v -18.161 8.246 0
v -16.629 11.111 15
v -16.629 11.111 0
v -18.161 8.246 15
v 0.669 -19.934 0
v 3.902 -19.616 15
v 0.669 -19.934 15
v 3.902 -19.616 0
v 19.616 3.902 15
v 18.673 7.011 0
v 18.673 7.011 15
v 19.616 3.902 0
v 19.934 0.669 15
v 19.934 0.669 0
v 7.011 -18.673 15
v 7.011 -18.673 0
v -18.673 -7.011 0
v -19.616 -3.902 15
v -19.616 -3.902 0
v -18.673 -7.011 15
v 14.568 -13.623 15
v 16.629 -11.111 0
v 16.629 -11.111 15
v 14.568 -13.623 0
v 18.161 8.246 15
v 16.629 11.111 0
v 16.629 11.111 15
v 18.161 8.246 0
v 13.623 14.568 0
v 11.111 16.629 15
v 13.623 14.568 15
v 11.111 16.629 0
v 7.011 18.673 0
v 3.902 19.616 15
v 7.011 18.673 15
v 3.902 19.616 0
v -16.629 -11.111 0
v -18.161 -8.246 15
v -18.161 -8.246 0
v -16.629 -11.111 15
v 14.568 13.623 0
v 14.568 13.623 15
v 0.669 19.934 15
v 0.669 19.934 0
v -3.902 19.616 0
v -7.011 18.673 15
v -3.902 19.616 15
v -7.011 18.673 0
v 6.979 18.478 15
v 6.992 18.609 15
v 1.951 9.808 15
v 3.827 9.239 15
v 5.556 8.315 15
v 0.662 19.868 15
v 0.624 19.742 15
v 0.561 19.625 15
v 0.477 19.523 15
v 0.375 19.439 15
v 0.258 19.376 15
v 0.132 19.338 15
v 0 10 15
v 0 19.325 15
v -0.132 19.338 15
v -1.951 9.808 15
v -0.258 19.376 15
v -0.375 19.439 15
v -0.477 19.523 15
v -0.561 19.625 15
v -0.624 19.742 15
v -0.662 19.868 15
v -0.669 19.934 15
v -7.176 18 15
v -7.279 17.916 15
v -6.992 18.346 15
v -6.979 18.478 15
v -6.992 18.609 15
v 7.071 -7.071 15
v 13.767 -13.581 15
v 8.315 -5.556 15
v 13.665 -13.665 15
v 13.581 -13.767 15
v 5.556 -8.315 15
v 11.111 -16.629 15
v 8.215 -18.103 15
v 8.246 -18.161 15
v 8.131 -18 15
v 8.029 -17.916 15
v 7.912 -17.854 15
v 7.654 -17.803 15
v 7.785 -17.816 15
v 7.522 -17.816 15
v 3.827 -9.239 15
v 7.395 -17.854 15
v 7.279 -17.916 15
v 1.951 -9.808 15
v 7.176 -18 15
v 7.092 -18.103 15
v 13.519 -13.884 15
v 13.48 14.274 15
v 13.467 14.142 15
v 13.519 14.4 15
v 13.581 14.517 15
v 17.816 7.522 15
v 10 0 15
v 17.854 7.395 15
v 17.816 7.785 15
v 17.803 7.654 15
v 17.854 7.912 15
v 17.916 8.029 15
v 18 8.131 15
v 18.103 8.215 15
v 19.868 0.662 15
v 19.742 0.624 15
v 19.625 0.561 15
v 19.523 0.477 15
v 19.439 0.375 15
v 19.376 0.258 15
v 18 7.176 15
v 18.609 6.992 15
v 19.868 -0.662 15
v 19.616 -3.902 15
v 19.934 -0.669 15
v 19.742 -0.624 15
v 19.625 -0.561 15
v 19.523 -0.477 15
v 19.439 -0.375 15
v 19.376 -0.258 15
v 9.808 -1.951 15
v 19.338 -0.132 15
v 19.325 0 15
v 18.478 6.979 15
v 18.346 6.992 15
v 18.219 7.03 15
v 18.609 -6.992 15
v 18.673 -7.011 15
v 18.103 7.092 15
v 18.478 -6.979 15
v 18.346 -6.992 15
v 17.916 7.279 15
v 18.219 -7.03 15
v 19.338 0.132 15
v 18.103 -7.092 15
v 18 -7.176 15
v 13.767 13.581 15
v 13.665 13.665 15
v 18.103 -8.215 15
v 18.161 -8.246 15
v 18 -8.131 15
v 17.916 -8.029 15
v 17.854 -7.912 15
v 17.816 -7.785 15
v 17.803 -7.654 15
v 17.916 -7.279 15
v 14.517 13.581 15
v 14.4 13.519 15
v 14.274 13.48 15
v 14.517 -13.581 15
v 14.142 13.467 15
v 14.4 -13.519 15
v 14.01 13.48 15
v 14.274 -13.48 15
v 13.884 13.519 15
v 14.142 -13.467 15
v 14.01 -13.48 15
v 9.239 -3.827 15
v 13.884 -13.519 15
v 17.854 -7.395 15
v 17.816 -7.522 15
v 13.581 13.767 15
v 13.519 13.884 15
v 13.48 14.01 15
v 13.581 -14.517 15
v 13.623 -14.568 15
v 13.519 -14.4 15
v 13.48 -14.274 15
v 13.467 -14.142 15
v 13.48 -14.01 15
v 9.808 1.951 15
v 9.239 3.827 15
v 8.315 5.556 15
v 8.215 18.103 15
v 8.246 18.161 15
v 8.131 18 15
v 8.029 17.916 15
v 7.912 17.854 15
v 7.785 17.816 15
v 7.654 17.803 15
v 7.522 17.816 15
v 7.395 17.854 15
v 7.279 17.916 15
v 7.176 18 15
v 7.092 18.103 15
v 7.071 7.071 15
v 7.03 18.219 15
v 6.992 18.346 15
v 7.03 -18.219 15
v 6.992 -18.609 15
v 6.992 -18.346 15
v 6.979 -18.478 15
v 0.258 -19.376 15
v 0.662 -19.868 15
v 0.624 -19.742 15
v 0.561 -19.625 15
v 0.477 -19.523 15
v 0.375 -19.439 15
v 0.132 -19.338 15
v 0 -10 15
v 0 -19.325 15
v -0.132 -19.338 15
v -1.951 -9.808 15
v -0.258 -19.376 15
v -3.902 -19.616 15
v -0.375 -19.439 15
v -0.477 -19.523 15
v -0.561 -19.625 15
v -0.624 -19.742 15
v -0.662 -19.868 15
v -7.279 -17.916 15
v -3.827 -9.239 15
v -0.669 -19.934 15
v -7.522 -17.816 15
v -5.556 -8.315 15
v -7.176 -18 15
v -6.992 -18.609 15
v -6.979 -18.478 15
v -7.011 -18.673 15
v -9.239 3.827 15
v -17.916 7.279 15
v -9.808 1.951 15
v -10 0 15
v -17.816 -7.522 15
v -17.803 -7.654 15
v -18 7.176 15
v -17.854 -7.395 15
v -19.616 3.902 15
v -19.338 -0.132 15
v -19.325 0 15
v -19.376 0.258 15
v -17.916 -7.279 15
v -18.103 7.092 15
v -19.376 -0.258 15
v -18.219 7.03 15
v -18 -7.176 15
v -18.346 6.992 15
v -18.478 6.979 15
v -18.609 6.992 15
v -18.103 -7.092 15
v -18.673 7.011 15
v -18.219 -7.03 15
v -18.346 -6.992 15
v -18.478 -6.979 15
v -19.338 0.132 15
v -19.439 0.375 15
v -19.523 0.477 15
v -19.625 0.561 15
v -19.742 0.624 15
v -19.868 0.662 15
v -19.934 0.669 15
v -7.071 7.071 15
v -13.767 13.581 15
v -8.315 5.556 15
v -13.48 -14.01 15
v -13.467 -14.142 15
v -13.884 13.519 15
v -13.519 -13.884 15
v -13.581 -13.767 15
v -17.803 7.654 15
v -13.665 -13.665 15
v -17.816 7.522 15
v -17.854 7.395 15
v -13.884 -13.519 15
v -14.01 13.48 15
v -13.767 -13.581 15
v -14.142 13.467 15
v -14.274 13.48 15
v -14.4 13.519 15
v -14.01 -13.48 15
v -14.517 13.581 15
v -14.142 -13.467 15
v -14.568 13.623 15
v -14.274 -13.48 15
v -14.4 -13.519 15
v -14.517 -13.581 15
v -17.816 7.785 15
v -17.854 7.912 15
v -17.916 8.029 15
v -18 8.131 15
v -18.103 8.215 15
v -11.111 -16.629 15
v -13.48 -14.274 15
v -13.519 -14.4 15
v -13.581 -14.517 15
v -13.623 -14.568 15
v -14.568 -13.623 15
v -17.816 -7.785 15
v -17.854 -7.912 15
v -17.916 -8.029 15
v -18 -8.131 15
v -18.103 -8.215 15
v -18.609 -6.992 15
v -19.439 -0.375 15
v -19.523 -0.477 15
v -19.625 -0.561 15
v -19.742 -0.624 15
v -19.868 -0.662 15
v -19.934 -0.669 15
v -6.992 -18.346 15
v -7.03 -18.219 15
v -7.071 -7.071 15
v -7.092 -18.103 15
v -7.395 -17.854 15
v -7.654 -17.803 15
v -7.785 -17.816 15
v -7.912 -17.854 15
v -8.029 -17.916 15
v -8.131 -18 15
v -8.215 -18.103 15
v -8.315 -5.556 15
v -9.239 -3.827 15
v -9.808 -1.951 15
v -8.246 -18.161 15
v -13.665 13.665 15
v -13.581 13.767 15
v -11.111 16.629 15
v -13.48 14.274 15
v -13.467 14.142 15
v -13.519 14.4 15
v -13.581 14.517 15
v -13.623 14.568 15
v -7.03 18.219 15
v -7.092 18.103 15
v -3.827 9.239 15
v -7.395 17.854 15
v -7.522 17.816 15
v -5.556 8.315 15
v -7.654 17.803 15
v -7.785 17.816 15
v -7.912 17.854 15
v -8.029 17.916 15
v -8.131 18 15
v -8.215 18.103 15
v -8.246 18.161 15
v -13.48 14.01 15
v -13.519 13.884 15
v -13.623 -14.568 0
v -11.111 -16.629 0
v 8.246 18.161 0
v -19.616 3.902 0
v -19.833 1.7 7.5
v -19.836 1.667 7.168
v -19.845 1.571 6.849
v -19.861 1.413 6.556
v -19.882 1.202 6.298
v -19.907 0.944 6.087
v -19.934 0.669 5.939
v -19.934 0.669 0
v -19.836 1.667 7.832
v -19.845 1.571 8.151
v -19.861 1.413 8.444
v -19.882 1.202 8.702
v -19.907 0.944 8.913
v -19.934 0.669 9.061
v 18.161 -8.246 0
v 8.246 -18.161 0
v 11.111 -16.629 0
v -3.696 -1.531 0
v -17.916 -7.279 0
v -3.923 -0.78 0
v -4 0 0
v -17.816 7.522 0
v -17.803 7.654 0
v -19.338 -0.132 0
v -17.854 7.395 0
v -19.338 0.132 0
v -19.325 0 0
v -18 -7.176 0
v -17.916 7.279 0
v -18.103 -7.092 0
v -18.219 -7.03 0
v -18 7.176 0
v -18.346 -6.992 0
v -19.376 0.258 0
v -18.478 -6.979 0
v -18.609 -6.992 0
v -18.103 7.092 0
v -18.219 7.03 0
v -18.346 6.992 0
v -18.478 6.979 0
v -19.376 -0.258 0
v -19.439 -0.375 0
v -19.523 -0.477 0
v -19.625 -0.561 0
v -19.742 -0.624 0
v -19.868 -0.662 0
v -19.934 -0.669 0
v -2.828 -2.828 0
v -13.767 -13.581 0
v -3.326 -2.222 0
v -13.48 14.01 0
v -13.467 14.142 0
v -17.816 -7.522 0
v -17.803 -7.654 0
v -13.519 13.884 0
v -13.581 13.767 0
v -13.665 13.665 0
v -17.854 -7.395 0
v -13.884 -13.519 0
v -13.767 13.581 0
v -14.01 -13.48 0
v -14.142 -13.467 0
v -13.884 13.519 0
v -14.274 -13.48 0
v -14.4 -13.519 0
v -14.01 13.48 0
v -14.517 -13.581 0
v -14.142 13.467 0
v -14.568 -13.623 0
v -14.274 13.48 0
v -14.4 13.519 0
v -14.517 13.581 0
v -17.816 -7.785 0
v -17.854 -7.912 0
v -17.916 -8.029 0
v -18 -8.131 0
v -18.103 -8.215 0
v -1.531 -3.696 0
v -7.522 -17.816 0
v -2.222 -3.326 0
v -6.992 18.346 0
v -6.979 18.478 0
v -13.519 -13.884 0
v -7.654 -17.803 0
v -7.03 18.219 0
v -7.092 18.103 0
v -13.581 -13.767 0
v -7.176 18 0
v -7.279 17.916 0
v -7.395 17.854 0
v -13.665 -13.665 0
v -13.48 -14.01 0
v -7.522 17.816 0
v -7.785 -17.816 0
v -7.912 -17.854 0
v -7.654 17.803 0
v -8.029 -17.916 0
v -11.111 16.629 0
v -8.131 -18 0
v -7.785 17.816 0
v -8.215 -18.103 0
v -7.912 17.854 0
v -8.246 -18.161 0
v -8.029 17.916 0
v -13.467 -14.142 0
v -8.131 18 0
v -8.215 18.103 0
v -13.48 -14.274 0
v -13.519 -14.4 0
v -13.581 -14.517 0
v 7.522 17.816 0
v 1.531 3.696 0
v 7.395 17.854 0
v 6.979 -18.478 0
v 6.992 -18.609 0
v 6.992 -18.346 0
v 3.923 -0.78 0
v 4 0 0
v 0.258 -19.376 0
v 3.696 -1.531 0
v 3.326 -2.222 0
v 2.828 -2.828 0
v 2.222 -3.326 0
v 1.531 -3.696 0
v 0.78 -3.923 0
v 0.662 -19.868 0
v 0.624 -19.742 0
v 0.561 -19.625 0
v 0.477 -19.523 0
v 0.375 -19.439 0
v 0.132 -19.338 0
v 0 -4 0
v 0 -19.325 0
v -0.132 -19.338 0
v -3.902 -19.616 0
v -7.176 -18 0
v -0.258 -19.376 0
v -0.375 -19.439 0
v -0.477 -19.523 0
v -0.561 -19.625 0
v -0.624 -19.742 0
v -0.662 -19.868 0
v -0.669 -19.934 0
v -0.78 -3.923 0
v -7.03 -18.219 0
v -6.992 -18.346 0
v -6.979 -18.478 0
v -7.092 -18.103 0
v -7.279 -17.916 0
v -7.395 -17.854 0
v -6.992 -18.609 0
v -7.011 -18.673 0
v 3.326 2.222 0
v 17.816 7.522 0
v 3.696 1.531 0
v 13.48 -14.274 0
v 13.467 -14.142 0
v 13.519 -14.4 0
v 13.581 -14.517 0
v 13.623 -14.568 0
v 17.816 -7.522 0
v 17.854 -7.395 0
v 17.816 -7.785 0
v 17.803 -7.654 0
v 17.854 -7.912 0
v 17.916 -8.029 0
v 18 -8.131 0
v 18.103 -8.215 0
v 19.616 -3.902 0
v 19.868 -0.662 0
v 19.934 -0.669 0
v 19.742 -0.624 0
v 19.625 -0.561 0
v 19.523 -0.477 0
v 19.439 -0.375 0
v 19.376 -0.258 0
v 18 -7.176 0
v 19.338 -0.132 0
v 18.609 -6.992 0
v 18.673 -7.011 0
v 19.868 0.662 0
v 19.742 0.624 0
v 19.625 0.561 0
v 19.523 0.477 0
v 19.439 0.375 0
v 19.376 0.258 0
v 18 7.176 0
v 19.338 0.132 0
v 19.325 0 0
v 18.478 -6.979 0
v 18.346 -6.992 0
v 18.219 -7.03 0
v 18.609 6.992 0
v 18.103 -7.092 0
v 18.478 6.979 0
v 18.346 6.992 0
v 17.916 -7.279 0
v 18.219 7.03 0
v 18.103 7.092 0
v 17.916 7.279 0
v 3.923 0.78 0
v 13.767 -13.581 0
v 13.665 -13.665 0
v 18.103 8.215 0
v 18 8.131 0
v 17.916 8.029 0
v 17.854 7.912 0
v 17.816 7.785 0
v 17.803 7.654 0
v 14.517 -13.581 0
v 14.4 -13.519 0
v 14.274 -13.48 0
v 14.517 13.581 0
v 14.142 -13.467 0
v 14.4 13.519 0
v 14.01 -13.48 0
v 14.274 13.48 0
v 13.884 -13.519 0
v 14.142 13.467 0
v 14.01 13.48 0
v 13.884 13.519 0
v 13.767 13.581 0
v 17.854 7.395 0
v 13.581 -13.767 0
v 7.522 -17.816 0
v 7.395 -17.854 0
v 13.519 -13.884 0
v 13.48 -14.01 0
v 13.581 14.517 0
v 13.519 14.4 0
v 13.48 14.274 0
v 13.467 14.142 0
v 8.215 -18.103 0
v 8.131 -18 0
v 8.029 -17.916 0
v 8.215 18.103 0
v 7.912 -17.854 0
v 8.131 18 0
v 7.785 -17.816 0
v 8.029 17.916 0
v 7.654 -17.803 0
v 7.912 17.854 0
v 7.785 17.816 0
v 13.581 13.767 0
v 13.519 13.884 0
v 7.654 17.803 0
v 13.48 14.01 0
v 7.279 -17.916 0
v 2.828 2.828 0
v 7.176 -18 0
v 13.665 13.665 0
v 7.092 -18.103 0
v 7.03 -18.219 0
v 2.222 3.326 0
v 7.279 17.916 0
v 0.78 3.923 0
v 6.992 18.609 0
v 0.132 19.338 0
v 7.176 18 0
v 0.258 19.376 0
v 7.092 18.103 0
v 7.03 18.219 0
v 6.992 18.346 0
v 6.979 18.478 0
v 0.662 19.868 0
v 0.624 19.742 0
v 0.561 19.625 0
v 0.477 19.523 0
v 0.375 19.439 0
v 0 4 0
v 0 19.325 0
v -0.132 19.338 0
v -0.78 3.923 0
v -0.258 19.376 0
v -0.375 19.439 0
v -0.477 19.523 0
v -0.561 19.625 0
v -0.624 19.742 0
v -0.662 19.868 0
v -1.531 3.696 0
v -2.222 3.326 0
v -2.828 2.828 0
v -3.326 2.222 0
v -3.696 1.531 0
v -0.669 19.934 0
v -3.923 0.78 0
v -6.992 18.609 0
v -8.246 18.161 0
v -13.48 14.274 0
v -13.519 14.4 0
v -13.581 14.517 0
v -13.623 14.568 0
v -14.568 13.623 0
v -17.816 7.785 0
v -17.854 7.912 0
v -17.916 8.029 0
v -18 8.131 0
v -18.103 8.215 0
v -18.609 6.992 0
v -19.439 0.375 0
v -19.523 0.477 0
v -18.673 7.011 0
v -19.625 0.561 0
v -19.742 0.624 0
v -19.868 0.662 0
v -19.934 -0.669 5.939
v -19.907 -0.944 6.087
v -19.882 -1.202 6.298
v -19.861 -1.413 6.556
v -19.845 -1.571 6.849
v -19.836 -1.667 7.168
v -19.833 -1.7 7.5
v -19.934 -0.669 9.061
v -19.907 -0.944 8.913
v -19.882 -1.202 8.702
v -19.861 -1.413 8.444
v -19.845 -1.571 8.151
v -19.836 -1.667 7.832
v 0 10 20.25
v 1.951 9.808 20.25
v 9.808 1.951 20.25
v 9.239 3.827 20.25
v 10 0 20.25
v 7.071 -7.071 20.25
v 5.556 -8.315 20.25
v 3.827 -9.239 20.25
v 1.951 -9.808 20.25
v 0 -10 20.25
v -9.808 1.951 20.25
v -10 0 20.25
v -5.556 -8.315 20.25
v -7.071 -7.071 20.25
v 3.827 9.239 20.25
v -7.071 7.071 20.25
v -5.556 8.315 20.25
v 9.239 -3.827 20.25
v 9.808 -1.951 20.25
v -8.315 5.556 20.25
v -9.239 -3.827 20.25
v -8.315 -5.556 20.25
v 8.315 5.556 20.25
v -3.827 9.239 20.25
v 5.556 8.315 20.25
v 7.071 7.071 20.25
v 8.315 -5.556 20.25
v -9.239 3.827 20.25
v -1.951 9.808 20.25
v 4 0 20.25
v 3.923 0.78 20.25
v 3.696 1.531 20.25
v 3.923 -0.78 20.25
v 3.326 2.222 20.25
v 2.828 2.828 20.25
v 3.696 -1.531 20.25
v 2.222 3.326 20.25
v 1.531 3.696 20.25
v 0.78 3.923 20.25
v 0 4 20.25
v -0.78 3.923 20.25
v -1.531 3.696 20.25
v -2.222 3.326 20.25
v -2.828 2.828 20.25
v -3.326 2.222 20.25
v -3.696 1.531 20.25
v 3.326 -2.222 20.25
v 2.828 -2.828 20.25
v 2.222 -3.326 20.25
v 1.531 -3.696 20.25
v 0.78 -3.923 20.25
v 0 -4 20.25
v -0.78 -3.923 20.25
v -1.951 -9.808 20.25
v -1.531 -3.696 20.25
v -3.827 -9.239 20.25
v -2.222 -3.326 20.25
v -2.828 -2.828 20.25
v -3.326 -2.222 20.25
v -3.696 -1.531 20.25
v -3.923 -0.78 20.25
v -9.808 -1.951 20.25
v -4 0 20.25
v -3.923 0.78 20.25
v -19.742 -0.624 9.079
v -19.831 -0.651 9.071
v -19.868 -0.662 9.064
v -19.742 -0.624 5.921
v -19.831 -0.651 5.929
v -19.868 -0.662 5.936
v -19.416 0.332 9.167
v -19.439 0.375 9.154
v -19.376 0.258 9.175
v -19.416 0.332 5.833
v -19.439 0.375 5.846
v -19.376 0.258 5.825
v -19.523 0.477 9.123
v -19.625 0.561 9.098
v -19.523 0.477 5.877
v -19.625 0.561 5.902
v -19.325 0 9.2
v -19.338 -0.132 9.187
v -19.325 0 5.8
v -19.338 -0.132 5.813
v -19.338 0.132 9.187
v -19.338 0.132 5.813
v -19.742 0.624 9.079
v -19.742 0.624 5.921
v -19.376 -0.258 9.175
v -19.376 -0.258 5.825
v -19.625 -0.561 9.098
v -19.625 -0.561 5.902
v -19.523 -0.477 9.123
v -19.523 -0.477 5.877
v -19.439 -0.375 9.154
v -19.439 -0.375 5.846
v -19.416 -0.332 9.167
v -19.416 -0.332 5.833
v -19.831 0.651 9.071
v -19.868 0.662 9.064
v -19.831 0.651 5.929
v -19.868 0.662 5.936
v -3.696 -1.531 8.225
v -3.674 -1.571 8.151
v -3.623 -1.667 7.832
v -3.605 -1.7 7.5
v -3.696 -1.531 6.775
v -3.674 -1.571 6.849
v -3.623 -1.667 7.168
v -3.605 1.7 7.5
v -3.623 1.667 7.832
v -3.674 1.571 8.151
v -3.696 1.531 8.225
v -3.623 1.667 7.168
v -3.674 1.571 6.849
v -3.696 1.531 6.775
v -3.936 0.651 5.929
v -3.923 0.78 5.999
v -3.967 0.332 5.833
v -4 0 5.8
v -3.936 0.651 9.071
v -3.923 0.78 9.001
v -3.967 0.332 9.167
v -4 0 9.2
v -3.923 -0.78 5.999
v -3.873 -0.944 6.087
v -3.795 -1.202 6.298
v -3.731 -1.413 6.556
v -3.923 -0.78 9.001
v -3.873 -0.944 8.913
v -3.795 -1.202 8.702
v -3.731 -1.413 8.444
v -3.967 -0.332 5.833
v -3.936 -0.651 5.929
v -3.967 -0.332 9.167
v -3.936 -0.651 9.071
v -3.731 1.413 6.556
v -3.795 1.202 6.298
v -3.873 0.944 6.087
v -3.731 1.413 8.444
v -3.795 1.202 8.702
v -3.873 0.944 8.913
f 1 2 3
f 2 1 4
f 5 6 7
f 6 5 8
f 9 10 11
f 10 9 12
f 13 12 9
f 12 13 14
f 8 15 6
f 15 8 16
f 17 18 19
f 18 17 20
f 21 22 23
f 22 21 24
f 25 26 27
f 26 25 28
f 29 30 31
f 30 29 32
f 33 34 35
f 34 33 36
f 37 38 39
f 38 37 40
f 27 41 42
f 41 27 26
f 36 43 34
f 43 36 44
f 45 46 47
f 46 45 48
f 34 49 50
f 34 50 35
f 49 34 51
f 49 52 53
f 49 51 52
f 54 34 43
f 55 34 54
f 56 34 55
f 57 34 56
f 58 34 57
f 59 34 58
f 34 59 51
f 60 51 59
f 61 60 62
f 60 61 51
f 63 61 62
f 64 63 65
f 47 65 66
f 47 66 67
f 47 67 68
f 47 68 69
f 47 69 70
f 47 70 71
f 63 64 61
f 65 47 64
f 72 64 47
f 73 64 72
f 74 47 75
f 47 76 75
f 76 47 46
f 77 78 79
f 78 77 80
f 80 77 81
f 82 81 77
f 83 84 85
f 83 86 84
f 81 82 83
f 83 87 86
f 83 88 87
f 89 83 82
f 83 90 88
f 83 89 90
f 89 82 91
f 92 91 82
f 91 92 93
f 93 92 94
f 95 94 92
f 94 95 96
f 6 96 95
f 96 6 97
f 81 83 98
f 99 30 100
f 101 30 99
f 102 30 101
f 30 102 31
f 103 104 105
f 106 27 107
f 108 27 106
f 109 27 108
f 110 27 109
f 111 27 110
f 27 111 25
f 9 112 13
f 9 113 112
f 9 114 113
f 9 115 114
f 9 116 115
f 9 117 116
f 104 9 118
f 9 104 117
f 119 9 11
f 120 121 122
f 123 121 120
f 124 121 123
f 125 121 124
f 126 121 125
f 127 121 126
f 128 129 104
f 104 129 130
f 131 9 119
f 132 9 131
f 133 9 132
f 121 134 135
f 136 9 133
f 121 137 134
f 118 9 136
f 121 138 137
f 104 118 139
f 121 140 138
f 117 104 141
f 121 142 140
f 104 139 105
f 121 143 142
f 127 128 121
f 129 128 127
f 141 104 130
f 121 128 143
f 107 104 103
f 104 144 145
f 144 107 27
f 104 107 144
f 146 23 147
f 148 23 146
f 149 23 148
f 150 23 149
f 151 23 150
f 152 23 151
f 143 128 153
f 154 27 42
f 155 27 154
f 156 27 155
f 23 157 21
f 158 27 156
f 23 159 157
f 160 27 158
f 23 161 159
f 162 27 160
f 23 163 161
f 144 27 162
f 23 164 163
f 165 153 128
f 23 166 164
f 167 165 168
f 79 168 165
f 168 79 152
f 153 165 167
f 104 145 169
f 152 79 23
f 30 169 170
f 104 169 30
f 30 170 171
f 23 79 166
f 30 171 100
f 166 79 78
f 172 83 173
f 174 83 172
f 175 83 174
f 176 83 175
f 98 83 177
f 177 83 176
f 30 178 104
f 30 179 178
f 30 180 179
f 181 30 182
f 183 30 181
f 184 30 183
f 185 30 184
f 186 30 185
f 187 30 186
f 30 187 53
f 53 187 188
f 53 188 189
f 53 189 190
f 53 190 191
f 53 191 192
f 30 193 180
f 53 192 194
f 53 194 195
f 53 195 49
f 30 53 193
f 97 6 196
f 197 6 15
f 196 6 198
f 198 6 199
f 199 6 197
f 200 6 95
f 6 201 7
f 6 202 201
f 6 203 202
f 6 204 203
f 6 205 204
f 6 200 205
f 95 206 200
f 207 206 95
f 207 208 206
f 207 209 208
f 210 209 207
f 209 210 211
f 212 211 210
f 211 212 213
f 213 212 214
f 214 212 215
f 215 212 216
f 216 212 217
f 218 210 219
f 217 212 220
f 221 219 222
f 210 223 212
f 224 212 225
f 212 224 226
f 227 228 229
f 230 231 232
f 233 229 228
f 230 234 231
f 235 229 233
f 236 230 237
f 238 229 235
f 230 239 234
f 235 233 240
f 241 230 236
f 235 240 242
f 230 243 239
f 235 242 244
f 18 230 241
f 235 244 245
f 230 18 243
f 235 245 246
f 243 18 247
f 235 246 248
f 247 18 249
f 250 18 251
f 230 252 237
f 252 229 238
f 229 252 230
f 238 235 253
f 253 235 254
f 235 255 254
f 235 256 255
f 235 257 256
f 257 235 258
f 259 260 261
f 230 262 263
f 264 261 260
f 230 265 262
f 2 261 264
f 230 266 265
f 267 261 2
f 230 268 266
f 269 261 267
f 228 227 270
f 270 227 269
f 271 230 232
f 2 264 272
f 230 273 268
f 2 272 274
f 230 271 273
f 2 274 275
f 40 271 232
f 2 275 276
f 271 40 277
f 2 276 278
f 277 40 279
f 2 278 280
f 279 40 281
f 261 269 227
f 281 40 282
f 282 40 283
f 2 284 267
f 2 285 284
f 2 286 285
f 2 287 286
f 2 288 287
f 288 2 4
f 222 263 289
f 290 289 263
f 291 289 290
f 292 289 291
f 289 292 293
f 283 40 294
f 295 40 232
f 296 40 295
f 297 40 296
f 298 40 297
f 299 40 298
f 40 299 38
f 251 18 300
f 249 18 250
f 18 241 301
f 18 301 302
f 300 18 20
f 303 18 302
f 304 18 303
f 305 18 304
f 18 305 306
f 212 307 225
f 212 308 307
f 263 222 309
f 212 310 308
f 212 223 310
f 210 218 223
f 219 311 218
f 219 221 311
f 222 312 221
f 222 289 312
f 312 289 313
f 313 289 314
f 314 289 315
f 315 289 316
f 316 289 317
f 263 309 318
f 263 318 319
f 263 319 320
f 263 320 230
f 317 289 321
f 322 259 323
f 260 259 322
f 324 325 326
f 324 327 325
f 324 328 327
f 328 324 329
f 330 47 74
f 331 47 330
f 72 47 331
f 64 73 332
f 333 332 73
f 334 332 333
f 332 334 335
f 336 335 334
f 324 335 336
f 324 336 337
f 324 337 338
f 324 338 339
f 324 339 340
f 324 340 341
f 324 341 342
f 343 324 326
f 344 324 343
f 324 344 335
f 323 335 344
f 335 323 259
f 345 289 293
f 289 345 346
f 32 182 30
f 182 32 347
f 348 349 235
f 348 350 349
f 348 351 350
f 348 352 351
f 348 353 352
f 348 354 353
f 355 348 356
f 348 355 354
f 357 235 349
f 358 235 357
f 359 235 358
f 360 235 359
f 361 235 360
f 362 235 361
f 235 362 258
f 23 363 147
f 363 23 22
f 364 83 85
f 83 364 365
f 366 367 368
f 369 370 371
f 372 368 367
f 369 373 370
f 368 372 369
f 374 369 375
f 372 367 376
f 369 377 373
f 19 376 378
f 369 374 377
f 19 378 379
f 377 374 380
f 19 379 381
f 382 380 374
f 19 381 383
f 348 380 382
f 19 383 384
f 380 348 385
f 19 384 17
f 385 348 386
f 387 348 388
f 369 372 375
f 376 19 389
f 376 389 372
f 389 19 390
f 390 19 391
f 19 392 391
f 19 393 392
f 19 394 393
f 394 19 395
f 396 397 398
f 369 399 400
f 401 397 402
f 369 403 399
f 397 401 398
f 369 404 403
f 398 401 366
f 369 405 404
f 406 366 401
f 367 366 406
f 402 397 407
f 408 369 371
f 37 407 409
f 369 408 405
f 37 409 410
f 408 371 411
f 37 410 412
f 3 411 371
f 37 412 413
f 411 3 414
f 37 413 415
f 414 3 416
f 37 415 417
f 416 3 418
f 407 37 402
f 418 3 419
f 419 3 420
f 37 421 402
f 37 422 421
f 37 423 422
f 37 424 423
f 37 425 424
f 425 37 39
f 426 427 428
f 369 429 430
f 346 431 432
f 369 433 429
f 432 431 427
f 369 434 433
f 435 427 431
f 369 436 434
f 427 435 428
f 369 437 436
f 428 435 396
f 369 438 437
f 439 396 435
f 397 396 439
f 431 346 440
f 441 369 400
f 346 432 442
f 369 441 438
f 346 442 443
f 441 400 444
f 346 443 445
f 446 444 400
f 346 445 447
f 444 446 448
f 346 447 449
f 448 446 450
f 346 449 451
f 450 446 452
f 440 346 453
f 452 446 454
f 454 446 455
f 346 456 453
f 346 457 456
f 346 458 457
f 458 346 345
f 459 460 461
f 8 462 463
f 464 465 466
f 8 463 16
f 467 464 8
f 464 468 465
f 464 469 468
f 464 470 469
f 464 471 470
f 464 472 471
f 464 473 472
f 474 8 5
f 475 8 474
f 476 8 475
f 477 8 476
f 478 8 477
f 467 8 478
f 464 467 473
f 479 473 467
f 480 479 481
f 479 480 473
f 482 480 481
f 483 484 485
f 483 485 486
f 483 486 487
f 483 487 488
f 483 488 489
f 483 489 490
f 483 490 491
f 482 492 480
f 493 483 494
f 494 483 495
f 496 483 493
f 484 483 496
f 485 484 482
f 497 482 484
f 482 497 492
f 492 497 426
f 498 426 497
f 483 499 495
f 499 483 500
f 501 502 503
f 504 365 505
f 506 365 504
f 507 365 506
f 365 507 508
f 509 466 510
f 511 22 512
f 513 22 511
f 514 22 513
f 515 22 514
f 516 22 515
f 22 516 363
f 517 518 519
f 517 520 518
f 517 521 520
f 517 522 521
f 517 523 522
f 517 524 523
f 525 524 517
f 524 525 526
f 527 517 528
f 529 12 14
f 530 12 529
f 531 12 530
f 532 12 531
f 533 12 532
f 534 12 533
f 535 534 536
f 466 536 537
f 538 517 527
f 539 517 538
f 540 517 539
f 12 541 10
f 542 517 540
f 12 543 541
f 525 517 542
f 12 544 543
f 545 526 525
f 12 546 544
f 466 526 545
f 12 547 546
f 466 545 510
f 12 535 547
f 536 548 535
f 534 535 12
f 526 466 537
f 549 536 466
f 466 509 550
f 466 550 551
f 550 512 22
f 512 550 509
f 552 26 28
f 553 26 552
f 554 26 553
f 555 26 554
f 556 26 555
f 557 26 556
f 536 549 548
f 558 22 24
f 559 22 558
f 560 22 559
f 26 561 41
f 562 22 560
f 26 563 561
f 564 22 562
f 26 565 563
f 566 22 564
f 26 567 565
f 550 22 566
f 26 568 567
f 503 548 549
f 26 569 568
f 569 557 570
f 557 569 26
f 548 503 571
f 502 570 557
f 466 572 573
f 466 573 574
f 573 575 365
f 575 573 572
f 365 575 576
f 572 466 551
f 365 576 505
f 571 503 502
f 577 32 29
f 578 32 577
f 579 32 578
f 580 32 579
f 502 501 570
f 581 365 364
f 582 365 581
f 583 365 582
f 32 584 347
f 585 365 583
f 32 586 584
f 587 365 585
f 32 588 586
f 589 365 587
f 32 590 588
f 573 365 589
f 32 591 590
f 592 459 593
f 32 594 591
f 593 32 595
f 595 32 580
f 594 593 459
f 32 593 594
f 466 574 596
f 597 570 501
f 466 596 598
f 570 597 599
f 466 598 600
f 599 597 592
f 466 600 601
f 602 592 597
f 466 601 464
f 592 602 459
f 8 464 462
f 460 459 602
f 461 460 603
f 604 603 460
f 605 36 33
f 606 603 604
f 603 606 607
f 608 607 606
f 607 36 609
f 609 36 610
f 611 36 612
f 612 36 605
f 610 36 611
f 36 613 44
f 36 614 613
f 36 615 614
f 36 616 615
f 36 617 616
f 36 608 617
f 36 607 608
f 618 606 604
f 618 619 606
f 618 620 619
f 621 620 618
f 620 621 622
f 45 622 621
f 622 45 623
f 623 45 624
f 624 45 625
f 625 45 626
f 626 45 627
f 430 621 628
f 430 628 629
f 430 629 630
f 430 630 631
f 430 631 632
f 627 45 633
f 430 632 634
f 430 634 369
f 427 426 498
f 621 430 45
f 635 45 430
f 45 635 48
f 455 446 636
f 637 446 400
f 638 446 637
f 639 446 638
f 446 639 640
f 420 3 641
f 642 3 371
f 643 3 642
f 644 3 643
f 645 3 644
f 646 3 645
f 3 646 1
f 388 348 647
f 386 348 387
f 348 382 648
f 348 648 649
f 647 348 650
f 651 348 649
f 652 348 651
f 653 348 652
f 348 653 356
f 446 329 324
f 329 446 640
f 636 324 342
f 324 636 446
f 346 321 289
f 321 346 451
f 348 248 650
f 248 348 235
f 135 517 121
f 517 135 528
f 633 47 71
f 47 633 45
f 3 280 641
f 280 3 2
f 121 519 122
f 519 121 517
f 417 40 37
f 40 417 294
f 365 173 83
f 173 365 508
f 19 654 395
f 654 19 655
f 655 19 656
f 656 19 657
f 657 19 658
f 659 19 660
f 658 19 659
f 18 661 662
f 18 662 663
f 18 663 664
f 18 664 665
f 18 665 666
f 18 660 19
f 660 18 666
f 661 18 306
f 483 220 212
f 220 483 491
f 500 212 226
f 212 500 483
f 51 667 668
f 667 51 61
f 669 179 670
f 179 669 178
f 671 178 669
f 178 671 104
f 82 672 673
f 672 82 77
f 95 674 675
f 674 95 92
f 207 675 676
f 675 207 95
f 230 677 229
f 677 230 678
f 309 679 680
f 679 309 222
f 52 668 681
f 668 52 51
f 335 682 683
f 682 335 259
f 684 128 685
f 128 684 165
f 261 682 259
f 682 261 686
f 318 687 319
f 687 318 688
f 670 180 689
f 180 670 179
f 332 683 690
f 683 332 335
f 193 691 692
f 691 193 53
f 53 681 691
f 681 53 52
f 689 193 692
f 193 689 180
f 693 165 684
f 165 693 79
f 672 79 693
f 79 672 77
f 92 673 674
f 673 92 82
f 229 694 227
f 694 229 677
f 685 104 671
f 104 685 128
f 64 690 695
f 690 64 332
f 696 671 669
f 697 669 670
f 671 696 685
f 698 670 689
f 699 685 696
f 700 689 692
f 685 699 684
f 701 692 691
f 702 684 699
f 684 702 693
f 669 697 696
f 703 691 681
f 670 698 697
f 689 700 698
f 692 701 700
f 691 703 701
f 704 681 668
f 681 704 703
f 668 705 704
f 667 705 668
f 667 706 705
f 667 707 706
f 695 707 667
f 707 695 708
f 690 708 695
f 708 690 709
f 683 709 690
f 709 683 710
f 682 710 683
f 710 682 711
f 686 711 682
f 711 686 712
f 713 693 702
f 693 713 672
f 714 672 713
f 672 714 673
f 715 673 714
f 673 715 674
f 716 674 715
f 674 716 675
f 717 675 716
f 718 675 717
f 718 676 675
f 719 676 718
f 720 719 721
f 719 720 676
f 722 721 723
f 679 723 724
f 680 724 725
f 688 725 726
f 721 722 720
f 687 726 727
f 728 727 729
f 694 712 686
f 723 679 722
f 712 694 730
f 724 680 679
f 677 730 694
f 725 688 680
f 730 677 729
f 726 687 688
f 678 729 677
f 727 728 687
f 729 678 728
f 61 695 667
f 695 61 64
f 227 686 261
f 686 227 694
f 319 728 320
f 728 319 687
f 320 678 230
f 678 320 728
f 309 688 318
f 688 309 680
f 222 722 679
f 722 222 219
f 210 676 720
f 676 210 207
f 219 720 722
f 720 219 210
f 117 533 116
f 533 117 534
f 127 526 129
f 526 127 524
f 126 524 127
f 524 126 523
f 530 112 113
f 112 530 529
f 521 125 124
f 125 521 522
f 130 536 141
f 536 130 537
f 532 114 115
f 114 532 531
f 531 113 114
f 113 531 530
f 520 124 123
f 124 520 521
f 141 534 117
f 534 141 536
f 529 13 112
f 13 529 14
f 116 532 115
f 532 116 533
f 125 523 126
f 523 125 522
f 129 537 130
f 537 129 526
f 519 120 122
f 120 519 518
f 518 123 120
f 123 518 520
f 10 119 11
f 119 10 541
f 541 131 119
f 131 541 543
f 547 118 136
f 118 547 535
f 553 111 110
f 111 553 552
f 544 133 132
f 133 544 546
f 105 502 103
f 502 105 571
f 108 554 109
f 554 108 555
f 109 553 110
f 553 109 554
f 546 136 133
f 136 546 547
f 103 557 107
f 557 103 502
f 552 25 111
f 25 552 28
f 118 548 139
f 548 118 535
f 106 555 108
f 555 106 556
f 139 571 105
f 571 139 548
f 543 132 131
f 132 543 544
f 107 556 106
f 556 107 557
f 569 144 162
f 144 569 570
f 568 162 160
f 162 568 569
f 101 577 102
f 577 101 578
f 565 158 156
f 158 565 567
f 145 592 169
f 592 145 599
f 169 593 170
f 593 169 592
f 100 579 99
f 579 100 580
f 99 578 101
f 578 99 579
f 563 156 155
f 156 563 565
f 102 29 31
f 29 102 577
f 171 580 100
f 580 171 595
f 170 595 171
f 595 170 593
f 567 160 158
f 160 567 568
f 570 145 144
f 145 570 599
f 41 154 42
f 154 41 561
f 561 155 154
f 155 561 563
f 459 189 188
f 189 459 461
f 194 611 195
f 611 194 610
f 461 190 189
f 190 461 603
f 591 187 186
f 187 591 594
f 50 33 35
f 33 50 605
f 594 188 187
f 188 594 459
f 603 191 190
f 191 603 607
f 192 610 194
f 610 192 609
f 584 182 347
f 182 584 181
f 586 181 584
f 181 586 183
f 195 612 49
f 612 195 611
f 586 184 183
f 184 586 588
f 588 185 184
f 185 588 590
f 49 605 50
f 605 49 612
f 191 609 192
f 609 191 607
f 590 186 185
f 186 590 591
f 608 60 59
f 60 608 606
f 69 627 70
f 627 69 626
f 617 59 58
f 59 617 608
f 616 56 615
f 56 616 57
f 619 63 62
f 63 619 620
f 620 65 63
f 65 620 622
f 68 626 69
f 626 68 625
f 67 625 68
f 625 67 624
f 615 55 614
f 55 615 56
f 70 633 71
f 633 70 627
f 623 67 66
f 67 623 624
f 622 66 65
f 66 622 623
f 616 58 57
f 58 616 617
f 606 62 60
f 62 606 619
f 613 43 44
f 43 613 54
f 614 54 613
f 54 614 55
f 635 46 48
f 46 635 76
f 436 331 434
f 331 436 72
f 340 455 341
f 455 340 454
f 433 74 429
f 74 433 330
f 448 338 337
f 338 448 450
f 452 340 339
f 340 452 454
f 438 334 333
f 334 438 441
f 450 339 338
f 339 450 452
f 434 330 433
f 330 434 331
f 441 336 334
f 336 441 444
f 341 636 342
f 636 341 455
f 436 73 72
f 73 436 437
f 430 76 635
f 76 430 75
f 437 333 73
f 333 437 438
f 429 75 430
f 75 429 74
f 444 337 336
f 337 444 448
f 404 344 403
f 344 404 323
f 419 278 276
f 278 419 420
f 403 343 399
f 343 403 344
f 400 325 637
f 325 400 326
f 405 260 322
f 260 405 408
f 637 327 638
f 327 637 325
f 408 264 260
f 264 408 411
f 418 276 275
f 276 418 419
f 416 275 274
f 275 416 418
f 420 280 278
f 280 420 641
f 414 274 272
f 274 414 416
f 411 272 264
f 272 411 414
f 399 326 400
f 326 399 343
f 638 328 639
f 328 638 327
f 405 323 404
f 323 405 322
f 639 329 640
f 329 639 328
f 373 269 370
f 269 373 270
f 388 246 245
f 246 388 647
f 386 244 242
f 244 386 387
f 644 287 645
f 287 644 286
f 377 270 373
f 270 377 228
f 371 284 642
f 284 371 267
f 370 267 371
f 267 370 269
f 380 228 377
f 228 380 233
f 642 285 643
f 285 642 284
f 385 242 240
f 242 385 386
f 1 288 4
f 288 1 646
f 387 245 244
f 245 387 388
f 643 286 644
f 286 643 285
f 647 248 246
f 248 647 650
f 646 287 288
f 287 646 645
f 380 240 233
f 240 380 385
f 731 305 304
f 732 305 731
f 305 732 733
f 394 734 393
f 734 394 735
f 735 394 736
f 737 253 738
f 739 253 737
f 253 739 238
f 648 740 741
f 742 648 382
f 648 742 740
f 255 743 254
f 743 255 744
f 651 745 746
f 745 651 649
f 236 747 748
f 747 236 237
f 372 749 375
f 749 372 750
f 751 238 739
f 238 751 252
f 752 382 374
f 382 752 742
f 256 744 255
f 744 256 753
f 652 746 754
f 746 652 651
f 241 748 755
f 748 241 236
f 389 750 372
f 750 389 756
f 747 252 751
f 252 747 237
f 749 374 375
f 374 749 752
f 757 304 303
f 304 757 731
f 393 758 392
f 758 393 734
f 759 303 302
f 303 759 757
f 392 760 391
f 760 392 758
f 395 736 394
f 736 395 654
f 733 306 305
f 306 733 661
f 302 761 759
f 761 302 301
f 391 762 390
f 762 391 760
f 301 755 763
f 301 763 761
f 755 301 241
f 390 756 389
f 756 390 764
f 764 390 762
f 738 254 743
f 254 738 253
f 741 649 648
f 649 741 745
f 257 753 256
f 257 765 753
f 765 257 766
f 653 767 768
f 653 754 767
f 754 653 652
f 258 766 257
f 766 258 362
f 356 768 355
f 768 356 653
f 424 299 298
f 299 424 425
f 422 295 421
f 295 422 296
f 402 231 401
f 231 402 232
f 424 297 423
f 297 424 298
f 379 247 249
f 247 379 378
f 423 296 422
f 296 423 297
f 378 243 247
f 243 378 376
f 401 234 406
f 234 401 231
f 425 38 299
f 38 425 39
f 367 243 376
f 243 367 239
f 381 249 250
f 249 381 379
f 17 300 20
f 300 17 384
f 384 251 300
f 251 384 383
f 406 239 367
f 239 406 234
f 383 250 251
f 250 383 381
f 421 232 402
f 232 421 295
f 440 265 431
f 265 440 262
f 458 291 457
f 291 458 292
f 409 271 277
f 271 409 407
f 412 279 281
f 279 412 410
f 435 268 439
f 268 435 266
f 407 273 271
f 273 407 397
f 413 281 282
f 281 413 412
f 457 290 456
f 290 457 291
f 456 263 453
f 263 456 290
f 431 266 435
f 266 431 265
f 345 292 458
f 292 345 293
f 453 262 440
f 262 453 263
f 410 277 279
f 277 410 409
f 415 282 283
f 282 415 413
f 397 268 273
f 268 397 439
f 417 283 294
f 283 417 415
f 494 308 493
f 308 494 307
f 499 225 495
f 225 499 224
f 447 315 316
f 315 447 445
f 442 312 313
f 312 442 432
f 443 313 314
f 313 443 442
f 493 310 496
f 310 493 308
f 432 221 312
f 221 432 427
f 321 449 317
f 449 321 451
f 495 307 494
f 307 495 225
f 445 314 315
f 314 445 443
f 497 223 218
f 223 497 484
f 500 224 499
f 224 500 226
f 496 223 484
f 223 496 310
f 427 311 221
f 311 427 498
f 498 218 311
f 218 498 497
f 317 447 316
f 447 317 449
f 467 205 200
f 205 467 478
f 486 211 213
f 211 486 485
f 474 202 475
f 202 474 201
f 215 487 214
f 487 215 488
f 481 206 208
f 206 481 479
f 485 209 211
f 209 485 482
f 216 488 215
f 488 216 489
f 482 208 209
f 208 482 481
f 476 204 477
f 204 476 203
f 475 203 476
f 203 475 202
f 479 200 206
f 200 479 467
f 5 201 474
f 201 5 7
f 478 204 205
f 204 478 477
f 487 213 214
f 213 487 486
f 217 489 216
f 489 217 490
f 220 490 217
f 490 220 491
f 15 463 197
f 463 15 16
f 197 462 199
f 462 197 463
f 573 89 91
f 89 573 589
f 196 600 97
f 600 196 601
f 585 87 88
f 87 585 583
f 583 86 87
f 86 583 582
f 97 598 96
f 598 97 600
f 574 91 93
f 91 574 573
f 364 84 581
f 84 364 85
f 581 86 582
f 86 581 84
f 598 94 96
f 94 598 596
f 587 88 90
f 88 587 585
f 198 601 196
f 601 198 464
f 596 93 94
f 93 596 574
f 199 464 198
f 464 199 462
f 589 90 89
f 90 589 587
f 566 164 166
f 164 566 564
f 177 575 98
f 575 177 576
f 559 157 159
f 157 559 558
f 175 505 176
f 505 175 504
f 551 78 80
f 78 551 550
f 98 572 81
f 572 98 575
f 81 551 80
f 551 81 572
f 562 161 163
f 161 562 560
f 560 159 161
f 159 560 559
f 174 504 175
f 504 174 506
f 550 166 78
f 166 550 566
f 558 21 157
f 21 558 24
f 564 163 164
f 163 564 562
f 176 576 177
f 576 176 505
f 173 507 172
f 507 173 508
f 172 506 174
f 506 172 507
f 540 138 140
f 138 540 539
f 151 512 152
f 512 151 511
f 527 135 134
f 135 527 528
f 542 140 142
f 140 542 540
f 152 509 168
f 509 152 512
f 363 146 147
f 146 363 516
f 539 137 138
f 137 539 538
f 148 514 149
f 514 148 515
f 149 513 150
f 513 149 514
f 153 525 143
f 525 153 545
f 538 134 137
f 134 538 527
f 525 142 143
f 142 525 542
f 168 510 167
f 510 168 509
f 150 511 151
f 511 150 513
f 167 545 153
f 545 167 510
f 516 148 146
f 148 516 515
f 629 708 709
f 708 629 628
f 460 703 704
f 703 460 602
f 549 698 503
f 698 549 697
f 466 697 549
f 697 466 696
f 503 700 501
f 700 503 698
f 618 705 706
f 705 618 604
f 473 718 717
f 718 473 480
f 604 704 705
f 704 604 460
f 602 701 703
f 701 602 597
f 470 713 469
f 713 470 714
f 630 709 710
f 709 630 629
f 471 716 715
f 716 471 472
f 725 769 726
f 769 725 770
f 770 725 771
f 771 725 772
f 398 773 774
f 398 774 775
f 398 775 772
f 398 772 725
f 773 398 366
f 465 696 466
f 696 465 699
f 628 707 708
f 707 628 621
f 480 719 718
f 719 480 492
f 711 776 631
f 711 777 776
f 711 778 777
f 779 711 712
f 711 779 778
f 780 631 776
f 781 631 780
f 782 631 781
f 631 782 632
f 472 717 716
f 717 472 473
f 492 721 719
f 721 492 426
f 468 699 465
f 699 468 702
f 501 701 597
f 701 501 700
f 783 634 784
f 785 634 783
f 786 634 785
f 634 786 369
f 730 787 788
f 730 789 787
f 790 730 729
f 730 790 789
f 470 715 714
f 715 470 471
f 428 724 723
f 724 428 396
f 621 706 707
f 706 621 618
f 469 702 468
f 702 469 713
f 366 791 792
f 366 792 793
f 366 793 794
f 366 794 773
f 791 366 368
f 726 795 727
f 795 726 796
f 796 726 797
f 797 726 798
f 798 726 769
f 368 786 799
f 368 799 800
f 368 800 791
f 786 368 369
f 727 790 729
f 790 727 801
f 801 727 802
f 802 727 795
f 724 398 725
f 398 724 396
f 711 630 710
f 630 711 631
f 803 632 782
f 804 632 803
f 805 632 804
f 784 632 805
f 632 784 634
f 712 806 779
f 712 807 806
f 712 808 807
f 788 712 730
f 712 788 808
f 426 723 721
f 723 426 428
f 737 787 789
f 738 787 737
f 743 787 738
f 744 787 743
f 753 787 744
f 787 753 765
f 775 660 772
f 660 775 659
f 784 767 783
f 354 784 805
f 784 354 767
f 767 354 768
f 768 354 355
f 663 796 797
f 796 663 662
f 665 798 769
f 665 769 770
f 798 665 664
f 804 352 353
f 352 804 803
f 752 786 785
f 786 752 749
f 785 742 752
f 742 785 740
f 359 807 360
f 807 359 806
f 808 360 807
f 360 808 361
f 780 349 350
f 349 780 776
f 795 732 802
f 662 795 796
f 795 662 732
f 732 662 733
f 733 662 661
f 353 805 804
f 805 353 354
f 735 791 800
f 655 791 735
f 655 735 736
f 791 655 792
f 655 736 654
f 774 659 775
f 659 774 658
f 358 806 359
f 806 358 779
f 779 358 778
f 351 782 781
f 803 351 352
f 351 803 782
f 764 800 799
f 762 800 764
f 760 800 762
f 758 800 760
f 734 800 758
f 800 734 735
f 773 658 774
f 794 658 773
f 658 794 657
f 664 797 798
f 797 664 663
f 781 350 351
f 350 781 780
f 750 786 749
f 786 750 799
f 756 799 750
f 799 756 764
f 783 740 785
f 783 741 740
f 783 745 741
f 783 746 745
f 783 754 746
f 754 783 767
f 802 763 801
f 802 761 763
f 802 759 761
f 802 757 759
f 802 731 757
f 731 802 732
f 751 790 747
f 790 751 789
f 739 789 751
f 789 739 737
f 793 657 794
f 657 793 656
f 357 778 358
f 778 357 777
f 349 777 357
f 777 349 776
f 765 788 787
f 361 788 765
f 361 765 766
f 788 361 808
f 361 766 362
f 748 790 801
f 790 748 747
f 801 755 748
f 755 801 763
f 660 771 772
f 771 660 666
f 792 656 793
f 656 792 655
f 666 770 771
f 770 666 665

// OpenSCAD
$fn = 32;

// ----------------------------------------------------------------------
// Hand knob: 40 x 40 x 20.25 mm
// ----------------------------------------------------------------------

// --- parameters (mm) ---
head_d = 40;              // knob diameter
head_h = 15;              // knob height
hole_d = 8;               // shaft bore
set_d = 3.4;              // set screw tap hole
notch_d = 1.35;           // knurl groove diameter
knurl_n = 16;             // number of knurl grooves
cap_h = 5.25;             // raised centre cap
cap_d = 20;               // centre cap diameter

module body() {
  cylinder(h = head_h, d = head_d);
}

module cap() {
  translate([0, 0, head_h - 1]) cylinder(h = cap_h + 1, d = cap_d);
}

difference() {
  union() {
    body();
    cap();
  }
  translate([0, 0, -1]) cylinder(h = head_h + cap_h + 2, d = hole_d);
  /* knurl grooves */
  for (i = [0 : knurl_n - 1])
    rotate([0, 0, i * 360 / knurl_n])
      translate([head_d / 2, 0, -0.5])
        cylinder(h = head_h + 1, d = notch_d);
  translate([-head_d / 2 - 1, 0, head_h * 0.5]) rotate([0, 90, 0]) cylinder(h = head_d / 2 + 2, d = set_d);
}
